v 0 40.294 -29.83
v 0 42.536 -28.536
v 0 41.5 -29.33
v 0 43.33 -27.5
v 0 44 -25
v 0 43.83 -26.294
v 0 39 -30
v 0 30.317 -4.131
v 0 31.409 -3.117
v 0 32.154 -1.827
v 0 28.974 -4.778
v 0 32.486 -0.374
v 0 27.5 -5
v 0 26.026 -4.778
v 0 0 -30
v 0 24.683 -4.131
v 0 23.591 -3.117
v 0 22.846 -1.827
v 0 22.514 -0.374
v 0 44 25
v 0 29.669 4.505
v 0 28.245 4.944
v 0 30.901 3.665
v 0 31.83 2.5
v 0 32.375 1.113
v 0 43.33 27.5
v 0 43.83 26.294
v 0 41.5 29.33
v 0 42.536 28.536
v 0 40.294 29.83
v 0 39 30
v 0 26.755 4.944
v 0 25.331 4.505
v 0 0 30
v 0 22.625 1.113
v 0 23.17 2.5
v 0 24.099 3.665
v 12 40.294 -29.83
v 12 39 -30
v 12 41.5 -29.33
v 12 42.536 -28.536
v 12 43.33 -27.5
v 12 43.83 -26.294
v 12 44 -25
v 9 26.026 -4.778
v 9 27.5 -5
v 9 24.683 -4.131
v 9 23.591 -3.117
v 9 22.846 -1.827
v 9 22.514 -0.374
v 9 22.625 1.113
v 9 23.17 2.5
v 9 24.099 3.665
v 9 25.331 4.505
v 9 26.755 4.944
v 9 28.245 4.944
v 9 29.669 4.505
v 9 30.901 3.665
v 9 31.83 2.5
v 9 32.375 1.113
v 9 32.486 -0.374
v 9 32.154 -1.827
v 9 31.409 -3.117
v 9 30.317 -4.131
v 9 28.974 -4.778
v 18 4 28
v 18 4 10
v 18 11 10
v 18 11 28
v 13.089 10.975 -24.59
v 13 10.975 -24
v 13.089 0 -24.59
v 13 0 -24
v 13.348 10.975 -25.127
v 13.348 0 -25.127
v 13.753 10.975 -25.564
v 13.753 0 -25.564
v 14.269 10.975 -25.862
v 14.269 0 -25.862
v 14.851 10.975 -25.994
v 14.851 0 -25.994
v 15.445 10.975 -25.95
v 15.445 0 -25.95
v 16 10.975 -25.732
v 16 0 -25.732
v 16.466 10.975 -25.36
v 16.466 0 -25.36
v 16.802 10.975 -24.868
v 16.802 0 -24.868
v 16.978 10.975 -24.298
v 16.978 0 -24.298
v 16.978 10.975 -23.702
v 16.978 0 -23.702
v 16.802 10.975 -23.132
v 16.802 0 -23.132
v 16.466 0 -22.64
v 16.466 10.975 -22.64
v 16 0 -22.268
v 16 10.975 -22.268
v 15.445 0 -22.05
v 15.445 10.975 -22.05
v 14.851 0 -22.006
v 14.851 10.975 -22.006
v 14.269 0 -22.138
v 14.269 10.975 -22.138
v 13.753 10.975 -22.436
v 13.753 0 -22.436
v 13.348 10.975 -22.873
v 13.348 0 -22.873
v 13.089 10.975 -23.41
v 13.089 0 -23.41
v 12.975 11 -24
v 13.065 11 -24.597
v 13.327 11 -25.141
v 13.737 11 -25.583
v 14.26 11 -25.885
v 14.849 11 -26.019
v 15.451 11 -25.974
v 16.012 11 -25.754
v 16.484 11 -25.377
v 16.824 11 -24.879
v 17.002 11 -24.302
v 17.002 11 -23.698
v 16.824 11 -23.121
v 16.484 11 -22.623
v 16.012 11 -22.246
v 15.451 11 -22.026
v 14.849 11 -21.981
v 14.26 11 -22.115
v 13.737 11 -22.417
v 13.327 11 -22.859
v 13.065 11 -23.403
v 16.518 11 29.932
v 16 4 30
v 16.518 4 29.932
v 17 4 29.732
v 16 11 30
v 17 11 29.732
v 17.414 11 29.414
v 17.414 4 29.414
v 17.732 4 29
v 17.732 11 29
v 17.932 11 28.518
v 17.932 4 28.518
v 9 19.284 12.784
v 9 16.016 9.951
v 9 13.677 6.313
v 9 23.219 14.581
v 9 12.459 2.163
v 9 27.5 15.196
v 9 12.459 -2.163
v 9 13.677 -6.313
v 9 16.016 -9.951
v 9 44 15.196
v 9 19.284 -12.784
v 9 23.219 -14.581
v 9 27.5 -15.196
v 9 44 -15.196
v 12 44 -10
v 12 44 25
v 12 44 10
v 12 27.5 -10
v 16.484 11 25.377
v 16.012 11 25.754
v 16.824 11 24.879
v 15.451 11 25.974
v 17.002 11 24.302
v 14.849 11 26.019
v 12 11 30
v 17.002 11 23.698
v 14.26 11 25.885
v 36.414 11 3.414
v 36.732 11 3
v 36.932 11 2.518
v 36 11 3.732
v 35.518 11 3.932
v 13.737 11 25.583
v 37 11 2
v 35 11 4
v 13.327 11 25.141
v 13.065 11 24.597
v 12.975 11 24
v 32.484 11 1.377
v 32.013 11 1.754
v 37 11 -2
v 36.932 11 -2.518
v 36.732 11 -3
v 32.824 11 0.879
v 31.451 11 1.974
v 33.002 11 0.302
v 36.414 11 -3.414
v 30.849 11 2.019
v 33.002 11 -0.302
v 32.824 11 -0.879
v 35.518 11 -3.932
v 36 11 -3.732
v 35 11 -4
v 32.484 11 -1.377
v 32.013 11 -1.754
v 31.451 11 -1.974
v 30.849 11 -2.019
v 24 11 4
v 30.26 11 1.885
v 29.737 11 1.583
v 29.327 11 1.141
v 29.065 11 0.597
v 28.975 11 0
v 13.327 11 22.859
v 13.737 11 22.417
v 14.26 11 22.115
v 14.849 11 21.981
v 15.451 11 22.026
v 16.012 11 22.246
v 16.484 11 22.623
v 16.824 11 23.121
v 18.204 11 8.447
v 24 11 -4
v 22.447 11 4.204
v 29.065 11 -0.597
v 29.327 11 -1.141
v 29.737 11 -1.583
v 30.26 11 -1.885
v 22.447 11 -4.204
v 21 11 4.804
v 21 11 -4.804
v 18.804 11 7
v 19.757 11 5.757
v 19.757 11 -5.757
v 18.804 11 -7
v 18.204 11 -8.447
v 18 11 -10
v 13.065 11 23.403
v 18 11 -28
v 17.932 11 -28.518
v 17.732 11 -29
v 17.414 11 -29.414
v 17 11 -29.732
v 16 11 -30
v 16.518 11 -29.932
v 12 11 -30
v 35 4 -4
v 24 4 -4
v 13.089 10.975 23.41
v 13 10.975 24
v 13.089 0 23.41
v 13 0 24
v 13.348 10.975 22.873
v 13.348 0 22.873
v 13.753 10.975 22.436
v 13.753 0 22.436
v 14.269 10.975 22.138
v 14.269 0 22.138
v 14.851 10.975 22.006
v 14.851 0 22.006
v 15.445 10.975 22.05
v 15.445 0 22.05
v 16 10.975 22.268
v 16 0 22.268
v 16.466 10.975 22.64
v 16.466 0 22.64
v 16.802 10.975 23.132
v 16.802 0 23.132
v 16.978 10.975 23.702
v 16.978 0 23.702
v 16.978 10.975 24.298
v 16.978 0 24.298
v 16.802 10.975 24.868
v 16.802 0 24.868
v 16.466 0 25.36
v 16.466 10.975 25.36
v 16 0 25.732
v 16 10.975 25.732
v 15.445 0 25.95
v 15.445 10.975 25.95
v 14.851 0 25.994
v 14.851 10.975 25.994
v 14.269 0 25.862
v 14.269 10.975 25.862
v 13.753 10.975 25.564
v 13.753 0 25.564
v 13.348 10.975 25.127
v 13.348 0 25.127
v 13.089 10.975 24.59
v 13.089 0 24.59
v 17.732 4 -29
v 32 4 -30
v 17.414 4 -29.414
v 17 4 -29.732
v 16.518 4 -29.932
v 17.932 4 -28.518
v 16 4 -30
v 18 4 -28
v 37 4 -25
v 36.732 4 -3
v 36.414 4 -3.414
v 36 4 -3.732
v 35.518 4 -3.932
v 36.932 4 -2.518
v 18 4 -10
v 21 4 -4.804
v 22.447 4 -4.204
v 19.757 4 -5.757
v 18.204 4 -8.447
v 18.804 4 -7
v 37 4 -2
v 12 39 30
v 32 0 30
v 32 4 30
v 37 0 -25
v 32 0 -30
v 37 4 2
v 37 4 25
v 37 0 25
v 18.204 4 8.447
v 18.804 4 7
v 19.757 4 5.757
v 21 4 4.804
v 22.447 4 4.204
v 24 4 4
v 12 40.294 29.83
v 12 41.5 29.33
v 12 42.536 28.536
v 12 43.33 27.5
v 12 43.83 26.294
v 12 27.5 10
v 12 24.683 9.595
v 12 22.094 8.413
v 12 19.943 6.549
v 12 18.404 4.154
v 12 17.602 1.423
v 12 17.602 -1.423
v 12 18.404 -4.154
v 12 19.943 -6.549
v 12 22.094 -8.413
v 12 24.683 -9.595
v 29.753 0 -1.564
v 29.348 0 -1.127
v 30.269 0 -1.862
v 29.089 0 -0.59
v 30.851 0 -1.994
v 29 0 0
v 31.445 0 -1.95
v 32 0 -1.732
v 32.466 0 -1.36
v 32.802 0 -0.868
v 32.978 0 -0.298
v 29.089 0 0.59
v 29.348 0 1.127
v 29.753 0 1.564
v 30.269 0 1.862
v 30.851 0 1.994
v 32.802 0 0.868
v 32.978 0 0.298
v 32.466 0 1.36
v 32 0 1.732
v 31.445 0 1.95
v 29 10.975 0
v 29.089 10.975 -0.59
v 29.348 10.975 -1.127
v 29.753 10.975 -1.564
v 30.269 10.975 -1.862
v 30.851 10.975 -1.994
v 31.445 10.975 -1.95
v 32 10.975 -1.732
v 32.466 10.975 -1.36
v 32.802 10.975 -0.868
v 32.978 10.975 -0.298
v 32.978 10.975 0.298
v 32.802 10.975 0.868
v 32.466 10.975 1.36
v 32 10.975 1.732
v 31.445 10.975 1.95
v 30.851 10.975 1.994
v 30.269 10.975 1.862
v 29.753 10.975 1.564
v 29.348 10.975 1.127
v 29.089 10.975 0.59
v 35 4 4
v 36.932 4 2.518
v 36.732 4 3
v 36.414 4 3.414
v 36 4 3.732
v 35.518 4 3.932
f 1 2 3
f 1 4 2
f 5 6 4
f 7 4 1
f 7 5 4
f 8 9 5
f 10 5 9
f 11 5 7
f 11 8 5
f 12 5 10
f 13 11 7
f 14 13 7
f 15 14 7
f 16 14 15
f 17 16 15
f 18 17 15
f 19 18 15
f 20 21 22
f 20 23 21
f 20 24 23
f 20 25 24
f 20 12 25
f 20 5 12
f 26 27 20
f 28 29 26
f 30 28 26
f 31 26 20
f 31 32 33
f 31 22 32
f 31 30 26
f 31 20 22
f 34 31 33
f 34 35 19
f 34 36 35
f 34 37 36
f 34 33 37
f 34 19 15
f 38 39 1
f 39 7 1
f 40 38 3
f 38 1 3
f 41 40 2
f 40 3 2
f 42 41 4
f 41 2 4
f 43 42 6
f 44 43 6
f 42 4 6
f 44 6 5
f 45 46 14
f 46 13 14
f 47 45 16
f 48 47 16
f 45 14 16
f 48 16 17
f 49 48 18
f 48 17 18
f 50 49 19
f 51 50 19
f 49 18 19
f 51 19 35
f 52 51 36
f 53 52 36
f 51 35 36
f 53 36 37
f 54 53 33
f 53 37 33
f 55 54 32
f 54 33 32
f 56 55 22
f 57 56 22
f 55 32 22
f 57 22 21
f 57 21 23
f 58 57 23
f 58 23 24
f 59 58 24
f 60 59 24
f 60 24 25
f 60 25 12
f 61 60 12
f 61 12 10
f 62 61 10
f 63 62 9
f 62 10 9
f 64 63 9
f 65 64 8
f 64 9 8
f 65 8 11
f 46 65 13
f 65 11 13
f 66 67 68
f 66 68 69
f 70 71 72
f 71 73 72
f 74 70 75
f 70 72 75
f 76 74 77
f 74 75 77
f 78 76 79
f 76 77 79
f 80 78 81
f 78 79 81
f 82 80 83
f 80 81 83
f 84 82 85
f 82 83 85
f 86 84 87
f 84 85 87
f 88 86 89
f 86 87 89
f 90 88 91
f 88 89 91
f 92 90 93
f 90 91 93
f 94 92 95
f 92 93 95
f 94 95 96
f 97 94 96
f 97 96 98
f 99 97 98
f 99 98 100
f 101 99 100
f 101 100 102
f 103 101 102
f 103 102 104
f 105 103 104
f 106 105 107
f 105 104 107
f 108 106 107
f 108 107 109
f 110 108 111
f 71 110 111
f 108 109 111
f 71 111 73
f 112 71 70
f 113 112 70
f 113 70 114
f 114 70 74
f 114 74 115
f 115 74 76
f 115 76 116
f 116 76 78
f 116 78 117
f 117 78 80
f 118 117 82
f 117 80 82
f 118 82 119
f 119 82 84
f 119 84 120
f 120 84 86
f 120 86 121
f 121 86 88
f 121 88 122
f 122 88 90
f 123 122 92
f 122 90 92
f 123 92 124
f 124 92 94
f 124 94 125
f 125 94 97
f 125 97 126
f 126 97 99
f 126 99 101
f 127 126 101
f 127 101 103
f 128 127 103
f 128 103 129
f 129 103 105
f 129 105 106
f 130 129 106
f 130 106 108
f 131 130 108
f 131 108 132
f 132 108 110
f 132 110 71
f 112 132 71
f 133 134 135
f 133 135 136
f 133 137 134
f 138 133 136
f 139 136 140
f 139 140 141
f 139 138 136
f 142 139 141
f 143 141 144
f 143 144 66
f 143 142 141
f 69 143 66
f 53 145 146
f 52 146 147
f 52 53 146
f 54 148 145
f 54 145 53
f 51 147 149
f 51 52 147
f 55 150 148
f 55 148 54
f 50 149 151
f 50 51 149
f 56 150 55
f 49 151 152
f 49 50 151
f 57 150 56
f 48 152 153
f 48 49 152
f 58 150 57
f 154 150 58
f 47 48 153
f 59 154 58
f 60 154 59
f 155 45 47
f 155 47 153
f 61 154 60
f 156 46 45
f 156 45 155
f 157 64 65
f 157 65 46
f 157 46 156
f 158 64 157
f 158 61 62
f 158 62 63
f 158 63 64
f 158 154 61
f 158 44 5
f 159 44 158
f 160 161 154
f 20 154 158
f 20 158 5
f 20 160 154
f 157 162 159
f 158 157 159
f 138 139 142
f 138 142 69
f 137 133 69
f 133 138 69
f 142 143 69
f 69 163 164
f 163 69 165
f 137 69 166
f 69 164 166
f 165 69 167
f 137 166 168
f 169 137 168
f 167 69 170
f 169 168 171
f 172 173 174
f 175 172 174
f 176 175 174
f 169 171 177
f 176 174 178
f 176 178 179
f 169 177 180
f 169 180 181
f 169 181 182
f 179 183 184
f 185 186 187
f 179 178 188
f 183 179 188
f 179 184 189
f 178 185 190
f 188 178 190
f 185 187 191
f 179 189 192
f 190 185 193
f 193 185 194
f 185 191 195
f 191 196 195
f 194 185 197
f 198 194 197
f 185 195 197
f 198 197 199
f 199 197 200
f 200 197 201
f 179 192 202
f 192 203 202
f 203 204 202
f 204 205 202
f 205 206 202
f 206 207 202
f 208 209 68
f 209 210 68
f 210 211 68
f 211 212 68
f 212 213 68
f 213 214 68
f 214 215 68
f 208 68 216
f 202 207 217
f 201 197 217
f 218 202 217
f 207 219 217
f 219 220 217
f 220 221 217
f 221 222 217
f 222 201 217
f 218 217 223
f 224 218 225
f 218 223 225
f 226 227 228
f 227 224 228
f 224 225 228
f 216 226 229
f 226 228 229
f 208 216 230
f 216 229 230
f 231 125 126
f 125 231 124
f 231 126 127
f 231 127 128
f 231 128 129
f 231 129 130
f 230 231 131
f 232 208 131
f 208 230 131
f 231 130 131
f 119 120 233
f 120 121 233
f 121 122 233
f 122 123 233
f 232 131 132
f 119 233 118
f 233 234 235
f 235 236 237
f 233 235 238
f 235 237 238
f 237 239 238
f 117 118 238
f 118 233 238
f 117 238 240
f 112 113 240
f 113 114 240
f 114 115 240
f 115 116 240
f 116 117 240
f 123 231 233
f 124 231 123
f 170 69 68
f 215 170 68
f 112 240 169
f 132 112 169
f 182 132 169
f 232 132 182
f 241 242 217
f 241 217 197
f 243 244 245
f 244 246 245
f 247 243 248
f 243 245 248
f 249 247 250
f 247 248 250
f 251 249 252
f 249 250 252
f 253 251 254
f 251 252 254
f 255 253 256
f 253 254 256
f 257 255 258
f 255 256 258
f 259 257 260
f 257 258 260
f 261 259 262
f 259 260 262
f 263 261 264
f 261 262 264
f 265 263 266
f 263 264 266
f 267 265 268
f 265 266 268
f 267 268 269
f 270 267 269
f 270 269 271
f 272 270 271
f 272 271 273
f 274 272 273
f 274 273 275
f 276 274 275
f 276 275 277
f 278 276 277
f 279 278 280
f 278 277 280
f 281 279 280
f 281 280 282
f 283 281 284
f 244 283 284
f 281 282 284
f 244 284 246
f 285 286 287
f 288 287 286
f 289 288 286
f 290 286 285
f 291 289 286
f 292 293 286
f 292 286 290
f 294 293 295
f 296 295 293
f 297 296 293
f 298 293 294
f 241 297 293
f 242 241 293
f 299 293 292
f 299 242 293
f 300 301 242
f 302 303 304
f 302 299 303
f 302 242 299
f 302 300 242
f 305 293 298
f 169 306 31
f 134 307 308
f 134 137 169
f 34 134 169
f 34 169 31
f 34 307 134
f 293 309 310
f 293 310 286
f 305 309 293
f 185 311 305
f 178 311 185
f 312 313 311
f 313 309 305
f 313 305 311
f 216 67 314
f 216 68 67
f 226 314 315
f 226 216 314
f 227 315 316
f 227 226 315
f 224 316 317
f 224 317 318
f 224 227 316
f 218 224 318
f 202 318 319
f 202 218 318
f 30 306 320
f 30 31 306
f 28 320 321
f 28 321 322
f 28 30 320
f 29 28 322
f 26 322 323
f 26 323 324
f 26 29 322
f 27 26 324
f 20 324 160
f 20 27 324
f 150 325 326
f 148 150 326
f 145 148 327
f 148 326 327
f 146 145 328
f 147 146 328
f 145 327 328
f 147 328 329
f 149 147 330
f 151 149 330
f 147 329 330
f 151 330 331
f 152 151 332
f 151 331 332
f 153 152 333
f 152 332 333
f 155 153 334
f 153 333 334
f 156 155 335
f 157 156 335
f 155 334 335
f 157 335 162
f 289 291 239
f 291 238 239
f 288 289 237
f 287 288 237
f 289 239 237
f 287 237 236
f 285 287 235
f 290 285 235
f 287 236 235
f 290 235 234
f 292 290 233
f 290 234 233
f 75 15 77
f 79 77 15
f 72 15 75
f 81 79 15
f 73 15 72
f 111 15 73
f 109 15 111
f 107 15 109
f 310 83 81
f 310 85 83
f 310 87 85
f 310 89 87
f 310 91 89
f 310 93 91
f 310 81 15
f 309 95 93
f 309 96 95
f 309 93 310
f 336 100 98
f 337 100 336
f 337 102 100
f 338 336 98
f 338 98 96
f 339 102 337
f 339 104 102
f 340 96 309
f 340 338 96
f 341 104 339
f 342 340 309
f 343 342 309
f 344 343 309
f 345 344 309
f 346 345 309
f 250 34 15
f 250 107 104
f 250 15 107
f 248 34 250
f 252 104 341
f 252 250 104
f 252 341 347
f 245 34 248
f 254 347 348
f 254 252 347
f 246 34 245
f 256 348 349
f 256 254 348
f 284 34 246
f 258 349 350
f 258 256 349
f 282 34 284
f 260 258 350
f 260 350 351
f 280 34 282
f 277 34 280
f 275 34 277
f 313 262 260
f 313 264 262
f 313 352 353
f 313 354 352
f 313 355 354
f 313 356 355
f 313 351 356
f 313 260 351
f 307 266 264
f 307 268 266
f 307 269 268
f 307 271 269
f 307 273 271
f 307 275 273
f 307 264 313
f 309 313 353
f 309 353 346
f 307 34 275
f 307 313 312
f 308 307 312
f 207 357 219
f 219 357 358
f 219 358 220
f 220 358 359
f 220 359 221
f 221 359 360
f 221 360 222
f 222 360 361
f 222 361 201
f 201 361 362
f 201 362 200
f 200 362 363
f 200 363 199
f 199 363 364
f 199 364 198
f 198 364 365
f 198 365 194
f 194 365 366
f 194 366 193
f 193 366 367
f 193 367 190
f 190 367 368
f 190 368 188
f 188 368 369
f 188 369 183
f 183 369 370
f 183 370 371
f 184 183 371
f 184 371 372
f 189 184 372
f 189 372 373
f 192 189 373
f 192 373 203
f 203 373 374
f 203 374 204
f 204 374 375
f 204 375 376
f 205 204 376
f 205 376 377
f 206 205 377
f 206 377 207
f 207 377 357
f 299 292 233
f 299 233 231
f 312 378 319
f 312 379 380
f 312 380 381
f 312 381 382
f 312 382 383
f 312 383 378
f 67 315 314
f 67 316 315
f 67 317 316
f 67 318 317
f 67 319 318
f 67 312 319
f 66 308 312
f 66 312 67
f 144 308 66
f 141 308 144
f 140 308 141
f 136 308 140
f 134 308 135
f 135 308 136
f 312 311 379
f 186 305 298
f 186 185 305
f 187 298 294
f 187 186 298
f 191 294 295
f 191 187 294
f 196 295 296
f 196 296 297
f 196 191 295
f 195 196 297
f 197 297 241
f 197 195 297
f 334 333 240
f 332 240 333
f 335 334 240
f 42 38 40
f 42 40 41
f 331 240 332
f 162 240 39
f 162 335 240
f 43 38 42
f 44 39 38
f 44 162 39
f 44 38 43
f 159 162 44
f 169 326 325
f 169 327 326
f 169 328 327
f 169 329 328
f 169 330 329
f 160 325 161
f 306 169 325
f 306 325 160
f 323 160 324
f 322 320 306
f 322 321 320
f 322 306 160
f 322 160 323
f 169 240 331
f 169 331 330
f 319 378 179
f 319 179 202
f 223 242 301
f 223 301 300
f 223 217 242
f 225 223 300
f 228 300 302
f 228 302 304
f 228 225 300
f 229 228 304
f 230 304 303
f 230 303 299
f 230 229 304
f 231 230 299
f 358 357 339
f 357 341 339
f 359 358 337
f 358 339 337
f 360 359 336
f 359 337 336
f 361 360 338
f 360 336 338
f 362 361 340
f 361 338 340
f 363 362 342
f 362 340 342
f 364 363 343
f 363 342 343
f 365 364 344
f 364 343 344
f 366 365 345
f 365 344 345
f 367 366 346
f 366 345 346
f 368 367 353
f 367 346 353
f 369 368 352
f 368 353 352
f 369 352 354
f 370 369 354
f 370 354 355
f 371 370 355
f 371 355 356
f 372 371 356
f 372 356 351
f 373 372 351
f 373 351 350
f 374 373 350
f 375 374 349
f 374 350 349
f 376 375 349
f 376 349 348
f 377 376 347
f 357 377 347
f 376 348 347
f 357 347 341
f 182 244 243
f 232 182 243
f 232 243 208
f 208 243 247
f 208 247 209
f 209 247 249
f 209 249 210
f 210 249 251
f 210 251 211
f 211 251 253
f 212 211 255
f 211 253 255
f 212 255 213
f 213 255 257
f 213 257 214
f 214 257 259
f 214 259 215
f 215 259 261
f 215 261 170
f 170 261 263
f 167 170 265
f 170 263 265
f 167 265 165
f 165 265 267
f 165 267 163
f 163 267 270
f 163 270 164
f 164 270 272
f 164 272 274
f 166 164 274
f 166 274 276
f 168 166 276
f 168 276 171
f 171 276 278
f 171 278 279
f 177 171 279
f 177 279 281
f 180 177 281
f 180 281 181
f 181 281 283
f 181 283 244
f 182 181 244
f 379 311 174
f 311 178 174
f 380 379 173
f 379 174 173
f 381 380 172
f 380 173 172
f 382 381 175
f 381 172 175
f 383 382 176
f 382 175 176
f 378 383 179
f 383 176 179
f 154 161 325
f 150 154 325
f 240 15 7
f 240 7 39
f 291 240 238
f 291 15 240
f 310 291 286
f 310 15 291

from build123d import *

# Parameters (mm, degrees)
ESTRUSIONE_ESTRUSIONE1_DEPTH = 30
ESTRUSIONE_ESTRUSIONE2_DEPTH = 7
FORO_10_0_10_1_D             = 10
FORO_10_0_10_1_CSINK_D       = 10.05
FORO_10_0_10_1_CSINK_ANGLE   = 90
FORO_4_0_4_1_D               = 4
FORO_4_0_4_1_CSINK_D         = 4.05
FORO_4_0_4_1_CSINK_ANGLE     = 90
SMUSSO1_SIZE                 = 5
RACCORDO1_R                  = 2
RACCORDO2_R                  = 6
RACCORDO3_R                  = 5
TAGLIO_ESTRUSIONE4_DEPTH     = 3
TAGLIO_ESTRUSIONE4_DRAFT     = 60


with BuildPart() as part:
    # Schizzo1 → Estrusione-Estrusione1 (new, symmetric)
    with BuildSketch(Plane.XY):
        Polygon((0, 44), (0, 0), (37, 0), (37, 4), (12, 4), (12, 44), align=None)
    extrude(amount=ESTRUSIONE_ESTRUSIONE1_DEPTH, both=True)

    # Schizzo3 → Estrusione-Estrusione2 (add)
    with BuildSketch(Plane(origin=(0, 4, 0), x_dir=(1, 0, 0), z_dir=(0, 1, 0))):
        Polygon((12, 30), (18, 30), (18, 4), (37, 4), (37, -4), (18, -4), (18, -30), (12, -30), align=None)
    extrude(amount=ESTRUSIONE_ESTRUSIONE2_DEPTH)

    # Foro Ø10.0 (10)-1 (through all)
    with Locations(Plane(origin=(12, 27.5, 0), x_dir=(0, 0, 1), z_dir=(1, 0, 0))):
        with Locations((0, 0)):
            CounterSinkHole(FORO_10_0_10_1_D / 2, FORO_10_0_10_1_CSINK_D / 2, counter_sink_angle=FORO_10_0_10_1_CSINK_ANGLE)

    # Foro Ø4.0 (4)-1 (through all)
    with Locations(Plane(origin=(15, 11, -24), x_dir=(1, 0, 0), z_dir=(0, 1, 0))):
        with Locations((0, 0), (16, -24), (0, -48)):
            CounterSinkHole(FORO_4_0_4_1_D / 2, FORO_4_0_4_1_CSINK_D / 2, counter_sink_angle=FORO_4_0_4_1_CSINK_ANGLE)

    # Smusso1
    smusso1_edges = [part.edges().sort_by_distance(p)[0] for p in [
        (37, 2, 30),
        (37, 2, -30),
    ]]
    chamfer(smusso1_edges, length=SMUSSO1_SIZE)

    # Raccordo1
    raccordo1_edges = [part.edges().sort_by_distance(p)[0] for p in [
        (18, 7.5, 30),
        (37, 7.5, 4),
        (37, 7.5, -4),
        (18, 7.5, -30),
    ]]
    fillet(raccordo1_edges, radius=RACCORDO1_R)

    # Raccordo2
    raccordo2_edges = [part.edges().sort_by_distance(p)[0] for p in [
        (18, 7.5, 4),
        (18, 7.5, -4),
    ]]
    fillet(raccordo2_edges, radius=RACCORDO2_R)

    # Raccordo3
    raccordo3_edges = [part.edges().sort_by_distance(p)[0] for p in [
        (6, 44, 30),
        (6, 44, -30),
    ]]
    fillet(raccordo3_edges, radius=RACCORDO3_R)


with BuildPart() as taglio_estrusione4_tool:
    # Schizzo2 → Taglio-Estrusione4 (with draft: the straight prism first)
    with BuildSketch(Plane(origin=(12, 0, 0), x_dir=(0, 0, -1), z_dir=(1, 0, 0))):
        with BuildLine():
            Line((-10, 42.375961669), (-10, 27.5))
            ThreePointArc((-10, 27.5), (0, 17.5), (10, 27.5))
            Line((10, 27.5), (10, 42.375961669))
            Line((10, 42.375961669), (10, 44))
            Line((10, 44), (-10, 44))
            Line((-10, 44), (-10, 42.375961669))
        make_face()
    extrude(amount=-TAGLIO_ESTRUSIONE4_DEPTH)
    # Taglio-Estrusione4: the draft: its side faces are tilted about the plane it starts from
    taglio_estrusione4_sides = [taglio_estrusione4_tool.faces().sort_by_distance(p)[0] for p in [
        (10.5, 35.75, 10),
        (10.5, 35.75, -10),
        (10.5, 44, 0),
        (10.5, 17.5, 0),
    ]]
    draft(taglio_estrusione4_sides, Plane(origin=(12, 0, 0), x_dir=(0, 0, -1), z_dir=(1, 0, 0)), TAGLIO_ESTRUSIONE4_DRAFT)


with BuildPart() as part_1:
    add(part.part)

    # Taglio-Estrusione4: cut by taglio_estrusione4_tool
    add(taglio_estrusione4_tool.part, mode=Mode.SUBTRACT)


solid = part_1.part
